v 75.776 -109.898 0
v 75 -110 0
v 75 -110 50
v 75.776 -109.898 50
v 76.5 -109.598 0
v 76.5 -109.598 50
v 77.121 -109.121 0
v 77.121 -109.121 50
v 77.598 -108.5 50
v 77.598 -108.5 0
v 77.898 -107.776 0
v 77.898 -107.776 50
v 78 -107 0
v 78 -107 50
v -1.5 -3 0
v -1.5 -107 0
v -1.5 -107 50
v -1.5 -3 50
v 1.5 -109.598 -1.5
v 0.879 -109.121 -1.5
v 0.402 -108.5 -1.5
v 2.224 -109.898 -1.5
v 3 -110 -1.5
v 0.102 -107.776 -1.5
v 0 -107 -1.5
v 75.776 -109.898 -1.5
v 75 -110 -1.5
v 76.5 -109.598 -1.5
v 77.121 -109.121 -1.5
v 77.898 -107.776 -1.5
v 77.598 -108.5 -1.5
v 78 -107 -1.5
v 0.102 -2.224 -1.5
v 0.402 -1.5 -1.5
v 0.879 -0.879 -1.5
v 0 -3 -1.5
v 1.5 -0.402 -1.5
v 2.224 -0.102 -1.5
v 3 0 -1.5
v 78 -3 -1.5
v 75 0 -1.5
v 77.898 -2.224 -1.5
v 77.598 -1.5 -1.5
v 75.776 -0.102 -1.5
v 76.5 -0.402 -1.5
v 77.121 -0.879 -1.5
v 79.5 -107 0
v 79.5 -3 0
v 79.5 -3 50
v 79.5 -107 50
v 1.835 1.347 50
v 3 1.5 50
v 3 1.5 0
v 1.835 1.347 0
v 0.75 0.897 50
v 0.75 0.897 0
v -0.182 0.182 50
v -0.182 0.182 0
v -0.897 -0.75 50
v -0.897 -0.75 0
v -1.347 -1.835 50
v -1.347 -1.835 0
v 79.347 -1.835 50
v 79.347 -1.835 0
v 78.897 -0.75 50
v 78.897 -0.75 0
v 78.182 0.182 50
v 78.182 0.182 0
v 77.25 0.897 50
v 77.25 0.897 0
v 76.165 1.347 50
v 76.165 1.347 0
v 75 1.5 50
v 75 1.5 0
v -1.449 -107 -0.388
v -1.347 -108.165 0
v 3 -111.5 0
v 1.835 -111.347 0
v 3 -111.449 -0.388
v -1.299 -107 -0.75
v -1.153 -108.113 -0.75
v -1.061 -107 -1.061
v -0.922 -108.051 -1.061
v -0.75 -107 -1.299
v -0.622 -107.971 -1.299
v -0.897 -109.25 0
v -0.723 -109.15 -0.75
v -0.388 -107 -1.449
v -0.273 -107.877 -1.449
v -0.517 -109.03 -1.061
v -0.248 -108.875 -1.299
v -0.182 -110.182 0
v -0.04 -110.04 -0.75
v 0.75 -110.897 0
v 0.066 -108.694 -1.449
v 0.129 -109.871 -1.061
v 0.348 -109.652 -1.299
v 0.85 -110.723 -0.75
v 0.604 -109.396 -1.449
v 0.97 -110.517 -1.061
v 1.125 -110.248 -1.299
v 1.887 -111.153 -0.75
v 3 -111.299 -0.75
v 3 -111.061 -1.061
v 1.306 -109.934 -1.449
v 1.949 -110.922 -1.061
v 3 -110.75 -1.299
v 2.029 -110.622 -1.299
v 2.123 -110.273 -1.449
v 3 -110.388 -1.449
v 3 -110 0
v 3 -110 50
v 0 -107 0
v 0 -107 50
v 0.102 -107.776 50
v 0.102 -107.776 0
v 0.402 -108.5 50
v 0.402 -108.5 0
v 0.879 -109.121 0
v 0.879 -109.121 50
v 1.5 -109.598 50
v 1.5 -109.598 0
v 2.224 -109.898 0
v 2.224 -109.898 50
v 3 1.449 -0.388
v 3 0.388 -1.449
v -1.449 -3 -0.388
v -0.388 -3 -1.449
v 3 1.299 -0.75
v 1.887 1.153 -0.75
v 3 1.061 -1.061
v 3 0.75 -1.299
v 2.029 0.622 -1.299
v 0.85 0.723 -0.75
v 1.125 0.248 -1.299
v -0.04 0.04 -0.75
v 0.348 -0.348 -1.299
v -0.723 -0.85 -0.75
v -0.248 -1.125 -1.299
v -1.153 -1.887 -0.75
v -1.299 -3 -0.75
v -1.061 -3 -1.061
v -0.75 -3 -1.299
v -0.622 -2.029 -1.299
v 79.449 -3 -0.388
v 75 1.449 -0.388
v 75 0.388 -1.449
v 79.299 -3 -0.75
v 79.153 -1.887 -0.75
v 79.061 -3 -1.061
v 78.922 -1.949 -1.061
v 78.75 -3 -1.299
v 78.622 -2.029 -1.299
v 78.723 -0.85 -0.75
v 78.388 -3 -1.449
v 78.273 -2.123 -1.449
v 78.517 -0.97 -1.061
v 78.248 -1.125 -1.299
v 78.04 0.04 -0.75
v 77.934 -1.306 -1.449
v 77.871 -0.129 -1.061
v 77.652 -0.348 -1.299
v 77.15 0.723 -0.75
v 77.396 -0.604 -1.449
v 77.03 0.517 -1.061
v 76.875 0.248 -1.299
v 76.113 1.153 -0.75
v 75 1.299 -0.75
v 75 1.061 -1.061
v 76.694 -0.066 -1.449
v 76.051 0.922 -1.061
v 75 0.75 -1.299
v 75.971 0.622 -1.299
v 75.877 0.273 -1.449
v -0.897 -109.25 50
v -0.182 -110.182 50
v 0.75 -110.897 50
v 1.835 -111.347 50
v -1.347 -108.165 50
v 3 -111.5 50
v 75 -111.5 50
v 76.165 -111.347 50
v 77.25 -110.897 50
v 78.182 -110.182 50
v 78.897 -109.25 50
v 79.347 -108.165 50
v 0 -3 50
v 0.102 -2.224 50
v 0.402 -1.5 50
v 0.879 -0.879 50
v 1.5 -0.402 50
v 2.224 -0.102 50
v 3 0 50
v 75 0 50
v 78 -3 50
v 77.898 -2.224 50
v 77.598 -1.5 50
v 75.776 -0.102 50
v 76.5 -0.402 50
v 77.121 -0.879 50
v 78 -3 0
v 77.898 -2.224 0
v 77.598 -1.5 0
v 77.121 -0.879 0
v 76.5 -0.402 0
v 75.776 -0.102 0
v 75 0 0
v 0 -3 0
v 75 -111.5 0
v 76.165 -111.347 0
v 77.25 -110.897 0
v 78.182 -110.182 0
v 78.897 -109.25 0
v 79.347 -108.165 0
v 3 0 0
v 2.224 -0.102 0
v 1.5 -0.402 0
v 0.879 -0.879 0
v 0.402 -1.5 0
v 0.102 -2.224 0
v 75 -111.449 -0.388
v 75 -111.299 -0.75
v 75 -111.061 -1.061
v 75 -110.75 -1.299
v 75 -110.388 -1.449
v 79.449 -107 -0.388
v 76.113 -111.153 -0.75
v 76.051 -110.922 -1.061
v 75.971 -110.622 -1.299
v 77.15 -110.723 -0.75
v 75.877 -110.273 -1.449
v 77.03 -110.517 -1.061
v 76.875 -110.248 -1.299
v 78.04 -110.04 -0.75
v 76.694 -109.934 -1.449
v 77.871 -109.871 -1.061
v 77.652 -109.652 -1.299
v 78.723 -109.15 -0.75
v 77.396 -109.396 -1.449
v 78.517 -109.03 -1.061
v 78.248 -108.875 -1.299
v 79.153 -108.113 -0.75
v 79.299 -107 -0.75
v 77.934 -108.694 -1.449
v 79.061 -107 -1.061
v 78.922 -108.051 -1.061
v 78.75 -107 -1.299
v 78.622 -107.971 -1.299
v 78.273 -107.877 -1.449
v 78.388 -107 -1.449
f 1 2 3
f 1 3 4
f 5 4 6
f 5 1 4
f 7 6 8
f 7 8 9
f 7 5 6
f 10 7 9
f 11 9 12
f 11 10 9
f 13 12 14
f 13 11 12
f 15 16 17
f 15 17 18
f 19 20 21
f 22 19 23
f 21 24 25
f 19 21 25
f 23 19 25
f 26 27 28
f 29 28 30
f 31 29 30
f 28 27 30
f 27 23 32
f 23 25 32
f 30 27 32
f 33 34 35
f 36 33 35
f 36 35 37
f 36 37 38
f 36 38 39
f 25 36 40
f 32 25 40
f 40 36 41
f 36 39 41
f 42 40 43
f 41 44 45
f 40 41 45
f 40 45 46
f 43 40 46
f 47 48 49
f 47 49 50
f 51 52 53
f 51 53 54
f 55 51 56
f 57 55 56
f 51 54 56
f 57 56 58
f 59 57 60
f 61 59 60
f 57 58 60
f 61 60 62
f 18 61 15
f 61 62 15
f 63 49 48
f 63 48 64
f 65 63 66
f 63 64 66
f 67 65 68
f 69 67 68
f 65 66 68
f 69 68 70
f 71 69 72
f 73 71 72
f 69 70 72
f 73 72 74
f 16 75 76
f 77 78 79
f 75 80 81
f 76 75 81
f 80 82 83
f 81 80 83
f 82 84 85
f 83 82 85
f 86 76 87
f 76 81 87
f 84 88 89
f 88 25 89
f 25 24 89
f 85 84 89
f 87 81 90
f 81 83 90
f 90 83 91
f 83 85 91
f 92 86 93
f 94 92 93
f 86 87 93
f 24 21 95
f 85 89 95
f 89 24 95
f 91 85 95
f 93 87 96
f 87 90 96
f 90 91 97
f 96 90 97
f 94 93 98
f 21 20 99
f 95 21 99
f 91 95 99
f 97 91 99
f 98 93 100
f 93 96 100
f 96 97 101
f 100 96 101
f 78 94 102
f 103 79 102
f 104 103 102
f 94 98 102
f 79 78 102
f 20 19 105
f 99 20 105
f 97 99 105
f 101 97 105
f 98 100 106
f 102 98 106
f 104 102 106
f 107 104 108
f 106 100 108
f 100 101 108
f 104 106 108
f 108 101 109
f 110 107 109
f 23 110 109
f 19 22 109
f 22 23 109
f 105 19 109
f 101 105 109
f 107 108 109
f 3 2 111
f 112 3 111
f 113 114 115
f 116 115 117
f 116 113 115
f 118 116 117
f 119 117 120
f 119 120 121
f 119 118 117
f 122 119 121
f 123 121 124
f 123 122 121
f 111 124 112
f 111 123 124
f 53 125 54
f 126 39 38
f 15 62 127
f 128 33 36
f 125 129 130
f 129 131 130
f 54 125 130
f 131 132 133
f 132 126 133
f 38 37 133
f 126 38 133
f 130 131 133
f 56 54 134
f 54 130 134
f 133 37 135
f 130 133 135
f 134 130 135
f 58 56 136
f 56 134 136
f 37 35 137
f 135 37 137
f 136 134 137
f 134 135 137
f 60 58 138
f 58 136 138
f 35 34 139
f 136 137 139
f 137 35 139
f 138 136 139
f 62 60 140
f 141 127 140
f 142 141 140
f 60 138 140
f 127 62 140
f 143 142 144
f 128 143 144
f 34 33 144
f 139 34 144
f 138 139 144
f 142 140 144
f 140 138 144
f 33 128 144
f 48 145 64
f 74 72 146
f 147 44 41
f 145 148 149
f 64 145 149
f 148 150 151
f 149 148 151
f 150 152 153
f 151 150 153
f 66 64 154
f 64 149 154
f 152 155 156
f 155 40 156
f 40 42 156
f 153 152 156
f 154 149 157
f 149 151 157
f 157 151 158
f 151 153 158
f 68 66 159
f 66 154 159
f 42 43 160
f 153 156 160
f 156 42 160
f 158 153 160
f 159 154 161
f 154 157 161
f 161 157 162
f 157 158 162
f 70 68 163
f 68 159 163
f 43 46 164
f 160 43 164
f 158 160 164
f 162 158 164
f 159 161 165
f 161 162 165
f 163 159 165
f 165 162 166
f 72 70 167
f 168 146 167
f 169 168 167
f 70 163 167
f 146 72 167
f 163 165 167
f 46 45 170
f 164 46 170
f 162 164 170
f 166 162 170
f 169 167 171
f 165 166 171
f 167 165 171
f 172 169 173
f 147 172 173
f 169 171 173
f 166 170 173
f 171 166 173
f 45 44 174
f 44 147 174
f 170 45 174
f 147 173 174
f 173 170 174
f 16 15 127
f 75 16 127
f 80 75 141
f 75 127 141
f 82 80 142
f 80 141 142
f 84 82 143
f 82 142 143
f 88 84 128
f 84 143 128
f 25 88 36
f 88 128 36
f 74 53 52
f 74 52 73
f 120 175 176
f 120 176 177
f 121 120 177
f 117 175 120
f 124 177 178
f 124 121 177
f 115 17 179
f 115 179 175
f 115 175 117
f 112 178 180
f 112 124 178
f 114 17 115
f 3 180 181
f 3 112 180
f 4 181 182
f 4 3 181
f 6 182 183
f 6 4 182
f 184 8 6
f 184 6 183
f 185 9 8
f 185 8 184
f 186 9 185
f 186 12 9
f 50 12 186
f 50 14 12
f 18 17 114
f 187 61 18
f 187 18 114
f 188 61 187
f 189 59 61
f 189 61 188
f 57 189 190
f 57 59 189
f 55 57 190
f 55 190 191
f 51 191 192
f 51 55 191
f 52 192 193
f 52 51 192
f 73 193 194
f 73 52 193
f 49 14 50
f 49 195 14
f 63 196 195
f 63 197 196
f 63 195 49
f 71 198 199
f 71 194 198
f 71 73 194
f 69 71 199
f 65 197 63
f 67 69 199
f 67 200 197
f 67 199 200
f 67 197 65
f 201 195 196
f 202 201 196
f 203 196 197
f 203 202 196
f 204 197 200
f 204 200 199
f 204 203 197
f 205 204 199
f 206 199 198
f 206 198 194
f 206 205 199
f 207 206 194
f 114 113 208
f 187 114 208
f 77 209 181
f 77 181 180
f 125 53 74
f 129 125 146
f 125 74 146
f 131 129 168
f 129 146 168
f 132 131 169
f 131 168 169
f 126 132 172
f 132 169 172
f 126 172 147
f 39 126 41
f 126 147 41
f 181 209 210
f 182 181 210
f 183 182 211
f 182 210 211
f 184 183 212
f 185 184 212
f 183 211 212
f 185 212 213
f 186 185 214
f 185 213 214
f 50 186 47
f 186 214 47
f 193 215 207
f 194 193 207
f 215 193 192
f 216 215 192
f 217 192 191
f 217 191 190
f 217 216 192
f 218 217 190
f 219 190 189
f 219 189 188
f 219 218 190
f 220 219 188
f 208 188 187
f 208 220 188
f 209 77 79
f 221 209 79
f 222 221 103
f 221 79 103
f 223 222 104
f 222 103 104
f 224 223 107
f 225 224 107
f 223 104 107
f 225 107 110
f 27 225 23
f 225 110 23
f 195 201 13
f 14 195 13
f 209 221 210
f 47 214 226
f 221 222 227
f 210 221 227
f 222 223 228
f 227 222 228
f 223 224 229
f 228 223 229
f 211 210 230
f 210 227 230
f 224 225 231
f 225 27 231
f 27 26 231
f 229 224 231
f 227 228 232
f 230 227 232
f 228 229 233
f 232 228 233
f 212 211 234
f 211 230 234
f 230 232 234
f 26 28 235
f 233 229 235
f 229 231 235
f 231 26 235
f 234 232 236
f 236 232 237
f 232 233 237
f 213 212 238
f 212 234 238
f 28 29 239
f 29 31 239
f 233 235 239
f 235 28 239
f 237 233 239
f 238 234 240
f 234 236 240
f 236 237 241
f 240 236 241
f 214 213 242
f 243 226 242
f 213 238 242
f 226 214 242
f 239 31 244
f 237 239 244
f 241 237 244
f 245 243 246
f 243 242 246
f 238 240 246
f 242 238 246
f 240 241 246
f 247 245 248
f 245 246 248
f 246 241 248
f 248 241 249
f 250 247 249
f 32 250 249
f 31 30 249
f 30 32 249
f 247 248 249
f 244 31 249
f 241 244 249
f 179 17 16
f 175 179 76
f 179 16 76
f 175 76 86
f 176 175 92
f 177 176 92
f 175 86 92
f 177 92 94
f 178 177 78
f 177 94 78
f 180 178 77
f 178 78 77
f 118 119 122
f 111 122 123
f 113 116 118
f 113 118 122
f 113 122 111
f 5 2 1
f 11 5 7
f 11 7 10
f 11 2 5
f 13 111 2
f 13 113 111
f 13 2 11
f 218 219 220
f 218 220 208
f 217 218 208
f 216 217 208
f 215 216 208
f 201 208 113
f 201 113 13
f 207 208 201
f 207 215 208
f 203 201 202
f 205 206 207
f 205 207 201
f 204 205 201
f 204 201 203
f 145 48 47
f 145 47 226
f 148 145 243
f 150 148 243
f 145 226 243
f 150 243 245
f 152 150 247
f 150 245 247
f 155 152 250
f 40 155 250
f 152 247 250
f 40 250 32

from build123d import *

# Parameters (mm, degrees)
PAD_DEPTH   = 50
THICKNESS_T = 1.5


with BuildPart() as part:
    # Sketch → Pad (new body)
    with BuildSketch(Plane.XY):
        with BuildLine():
            ThreePointArc((3, 0), (0.87868, -0.87868), (0, -3))
            Line((0, -107), (0, -3))
            ThreePointArc((0, -107), (0.87868, -109.12132), (3, -110))
            Line((75, -110), (3, -110))
            ThreePointArc((75, -110), (77.12132, -109.12132), (78, -107))
            Line((78, -3), (78, -107))
            ThreePointArc((78, -3), (77.12132, -0.87868), (75, 0))
            Line((3, 0), (75, 0))
        make_face()
    extrude(amount=PAD_DEPTH)

    # Thickness
    thickness_openings = [part.faces().sort_by_distance(p)[0] for p in [
        (39, -55, 50),
    ]]
    offset(amount=THICKNESS_T, openings=thickness_openings)


solid = part.part
